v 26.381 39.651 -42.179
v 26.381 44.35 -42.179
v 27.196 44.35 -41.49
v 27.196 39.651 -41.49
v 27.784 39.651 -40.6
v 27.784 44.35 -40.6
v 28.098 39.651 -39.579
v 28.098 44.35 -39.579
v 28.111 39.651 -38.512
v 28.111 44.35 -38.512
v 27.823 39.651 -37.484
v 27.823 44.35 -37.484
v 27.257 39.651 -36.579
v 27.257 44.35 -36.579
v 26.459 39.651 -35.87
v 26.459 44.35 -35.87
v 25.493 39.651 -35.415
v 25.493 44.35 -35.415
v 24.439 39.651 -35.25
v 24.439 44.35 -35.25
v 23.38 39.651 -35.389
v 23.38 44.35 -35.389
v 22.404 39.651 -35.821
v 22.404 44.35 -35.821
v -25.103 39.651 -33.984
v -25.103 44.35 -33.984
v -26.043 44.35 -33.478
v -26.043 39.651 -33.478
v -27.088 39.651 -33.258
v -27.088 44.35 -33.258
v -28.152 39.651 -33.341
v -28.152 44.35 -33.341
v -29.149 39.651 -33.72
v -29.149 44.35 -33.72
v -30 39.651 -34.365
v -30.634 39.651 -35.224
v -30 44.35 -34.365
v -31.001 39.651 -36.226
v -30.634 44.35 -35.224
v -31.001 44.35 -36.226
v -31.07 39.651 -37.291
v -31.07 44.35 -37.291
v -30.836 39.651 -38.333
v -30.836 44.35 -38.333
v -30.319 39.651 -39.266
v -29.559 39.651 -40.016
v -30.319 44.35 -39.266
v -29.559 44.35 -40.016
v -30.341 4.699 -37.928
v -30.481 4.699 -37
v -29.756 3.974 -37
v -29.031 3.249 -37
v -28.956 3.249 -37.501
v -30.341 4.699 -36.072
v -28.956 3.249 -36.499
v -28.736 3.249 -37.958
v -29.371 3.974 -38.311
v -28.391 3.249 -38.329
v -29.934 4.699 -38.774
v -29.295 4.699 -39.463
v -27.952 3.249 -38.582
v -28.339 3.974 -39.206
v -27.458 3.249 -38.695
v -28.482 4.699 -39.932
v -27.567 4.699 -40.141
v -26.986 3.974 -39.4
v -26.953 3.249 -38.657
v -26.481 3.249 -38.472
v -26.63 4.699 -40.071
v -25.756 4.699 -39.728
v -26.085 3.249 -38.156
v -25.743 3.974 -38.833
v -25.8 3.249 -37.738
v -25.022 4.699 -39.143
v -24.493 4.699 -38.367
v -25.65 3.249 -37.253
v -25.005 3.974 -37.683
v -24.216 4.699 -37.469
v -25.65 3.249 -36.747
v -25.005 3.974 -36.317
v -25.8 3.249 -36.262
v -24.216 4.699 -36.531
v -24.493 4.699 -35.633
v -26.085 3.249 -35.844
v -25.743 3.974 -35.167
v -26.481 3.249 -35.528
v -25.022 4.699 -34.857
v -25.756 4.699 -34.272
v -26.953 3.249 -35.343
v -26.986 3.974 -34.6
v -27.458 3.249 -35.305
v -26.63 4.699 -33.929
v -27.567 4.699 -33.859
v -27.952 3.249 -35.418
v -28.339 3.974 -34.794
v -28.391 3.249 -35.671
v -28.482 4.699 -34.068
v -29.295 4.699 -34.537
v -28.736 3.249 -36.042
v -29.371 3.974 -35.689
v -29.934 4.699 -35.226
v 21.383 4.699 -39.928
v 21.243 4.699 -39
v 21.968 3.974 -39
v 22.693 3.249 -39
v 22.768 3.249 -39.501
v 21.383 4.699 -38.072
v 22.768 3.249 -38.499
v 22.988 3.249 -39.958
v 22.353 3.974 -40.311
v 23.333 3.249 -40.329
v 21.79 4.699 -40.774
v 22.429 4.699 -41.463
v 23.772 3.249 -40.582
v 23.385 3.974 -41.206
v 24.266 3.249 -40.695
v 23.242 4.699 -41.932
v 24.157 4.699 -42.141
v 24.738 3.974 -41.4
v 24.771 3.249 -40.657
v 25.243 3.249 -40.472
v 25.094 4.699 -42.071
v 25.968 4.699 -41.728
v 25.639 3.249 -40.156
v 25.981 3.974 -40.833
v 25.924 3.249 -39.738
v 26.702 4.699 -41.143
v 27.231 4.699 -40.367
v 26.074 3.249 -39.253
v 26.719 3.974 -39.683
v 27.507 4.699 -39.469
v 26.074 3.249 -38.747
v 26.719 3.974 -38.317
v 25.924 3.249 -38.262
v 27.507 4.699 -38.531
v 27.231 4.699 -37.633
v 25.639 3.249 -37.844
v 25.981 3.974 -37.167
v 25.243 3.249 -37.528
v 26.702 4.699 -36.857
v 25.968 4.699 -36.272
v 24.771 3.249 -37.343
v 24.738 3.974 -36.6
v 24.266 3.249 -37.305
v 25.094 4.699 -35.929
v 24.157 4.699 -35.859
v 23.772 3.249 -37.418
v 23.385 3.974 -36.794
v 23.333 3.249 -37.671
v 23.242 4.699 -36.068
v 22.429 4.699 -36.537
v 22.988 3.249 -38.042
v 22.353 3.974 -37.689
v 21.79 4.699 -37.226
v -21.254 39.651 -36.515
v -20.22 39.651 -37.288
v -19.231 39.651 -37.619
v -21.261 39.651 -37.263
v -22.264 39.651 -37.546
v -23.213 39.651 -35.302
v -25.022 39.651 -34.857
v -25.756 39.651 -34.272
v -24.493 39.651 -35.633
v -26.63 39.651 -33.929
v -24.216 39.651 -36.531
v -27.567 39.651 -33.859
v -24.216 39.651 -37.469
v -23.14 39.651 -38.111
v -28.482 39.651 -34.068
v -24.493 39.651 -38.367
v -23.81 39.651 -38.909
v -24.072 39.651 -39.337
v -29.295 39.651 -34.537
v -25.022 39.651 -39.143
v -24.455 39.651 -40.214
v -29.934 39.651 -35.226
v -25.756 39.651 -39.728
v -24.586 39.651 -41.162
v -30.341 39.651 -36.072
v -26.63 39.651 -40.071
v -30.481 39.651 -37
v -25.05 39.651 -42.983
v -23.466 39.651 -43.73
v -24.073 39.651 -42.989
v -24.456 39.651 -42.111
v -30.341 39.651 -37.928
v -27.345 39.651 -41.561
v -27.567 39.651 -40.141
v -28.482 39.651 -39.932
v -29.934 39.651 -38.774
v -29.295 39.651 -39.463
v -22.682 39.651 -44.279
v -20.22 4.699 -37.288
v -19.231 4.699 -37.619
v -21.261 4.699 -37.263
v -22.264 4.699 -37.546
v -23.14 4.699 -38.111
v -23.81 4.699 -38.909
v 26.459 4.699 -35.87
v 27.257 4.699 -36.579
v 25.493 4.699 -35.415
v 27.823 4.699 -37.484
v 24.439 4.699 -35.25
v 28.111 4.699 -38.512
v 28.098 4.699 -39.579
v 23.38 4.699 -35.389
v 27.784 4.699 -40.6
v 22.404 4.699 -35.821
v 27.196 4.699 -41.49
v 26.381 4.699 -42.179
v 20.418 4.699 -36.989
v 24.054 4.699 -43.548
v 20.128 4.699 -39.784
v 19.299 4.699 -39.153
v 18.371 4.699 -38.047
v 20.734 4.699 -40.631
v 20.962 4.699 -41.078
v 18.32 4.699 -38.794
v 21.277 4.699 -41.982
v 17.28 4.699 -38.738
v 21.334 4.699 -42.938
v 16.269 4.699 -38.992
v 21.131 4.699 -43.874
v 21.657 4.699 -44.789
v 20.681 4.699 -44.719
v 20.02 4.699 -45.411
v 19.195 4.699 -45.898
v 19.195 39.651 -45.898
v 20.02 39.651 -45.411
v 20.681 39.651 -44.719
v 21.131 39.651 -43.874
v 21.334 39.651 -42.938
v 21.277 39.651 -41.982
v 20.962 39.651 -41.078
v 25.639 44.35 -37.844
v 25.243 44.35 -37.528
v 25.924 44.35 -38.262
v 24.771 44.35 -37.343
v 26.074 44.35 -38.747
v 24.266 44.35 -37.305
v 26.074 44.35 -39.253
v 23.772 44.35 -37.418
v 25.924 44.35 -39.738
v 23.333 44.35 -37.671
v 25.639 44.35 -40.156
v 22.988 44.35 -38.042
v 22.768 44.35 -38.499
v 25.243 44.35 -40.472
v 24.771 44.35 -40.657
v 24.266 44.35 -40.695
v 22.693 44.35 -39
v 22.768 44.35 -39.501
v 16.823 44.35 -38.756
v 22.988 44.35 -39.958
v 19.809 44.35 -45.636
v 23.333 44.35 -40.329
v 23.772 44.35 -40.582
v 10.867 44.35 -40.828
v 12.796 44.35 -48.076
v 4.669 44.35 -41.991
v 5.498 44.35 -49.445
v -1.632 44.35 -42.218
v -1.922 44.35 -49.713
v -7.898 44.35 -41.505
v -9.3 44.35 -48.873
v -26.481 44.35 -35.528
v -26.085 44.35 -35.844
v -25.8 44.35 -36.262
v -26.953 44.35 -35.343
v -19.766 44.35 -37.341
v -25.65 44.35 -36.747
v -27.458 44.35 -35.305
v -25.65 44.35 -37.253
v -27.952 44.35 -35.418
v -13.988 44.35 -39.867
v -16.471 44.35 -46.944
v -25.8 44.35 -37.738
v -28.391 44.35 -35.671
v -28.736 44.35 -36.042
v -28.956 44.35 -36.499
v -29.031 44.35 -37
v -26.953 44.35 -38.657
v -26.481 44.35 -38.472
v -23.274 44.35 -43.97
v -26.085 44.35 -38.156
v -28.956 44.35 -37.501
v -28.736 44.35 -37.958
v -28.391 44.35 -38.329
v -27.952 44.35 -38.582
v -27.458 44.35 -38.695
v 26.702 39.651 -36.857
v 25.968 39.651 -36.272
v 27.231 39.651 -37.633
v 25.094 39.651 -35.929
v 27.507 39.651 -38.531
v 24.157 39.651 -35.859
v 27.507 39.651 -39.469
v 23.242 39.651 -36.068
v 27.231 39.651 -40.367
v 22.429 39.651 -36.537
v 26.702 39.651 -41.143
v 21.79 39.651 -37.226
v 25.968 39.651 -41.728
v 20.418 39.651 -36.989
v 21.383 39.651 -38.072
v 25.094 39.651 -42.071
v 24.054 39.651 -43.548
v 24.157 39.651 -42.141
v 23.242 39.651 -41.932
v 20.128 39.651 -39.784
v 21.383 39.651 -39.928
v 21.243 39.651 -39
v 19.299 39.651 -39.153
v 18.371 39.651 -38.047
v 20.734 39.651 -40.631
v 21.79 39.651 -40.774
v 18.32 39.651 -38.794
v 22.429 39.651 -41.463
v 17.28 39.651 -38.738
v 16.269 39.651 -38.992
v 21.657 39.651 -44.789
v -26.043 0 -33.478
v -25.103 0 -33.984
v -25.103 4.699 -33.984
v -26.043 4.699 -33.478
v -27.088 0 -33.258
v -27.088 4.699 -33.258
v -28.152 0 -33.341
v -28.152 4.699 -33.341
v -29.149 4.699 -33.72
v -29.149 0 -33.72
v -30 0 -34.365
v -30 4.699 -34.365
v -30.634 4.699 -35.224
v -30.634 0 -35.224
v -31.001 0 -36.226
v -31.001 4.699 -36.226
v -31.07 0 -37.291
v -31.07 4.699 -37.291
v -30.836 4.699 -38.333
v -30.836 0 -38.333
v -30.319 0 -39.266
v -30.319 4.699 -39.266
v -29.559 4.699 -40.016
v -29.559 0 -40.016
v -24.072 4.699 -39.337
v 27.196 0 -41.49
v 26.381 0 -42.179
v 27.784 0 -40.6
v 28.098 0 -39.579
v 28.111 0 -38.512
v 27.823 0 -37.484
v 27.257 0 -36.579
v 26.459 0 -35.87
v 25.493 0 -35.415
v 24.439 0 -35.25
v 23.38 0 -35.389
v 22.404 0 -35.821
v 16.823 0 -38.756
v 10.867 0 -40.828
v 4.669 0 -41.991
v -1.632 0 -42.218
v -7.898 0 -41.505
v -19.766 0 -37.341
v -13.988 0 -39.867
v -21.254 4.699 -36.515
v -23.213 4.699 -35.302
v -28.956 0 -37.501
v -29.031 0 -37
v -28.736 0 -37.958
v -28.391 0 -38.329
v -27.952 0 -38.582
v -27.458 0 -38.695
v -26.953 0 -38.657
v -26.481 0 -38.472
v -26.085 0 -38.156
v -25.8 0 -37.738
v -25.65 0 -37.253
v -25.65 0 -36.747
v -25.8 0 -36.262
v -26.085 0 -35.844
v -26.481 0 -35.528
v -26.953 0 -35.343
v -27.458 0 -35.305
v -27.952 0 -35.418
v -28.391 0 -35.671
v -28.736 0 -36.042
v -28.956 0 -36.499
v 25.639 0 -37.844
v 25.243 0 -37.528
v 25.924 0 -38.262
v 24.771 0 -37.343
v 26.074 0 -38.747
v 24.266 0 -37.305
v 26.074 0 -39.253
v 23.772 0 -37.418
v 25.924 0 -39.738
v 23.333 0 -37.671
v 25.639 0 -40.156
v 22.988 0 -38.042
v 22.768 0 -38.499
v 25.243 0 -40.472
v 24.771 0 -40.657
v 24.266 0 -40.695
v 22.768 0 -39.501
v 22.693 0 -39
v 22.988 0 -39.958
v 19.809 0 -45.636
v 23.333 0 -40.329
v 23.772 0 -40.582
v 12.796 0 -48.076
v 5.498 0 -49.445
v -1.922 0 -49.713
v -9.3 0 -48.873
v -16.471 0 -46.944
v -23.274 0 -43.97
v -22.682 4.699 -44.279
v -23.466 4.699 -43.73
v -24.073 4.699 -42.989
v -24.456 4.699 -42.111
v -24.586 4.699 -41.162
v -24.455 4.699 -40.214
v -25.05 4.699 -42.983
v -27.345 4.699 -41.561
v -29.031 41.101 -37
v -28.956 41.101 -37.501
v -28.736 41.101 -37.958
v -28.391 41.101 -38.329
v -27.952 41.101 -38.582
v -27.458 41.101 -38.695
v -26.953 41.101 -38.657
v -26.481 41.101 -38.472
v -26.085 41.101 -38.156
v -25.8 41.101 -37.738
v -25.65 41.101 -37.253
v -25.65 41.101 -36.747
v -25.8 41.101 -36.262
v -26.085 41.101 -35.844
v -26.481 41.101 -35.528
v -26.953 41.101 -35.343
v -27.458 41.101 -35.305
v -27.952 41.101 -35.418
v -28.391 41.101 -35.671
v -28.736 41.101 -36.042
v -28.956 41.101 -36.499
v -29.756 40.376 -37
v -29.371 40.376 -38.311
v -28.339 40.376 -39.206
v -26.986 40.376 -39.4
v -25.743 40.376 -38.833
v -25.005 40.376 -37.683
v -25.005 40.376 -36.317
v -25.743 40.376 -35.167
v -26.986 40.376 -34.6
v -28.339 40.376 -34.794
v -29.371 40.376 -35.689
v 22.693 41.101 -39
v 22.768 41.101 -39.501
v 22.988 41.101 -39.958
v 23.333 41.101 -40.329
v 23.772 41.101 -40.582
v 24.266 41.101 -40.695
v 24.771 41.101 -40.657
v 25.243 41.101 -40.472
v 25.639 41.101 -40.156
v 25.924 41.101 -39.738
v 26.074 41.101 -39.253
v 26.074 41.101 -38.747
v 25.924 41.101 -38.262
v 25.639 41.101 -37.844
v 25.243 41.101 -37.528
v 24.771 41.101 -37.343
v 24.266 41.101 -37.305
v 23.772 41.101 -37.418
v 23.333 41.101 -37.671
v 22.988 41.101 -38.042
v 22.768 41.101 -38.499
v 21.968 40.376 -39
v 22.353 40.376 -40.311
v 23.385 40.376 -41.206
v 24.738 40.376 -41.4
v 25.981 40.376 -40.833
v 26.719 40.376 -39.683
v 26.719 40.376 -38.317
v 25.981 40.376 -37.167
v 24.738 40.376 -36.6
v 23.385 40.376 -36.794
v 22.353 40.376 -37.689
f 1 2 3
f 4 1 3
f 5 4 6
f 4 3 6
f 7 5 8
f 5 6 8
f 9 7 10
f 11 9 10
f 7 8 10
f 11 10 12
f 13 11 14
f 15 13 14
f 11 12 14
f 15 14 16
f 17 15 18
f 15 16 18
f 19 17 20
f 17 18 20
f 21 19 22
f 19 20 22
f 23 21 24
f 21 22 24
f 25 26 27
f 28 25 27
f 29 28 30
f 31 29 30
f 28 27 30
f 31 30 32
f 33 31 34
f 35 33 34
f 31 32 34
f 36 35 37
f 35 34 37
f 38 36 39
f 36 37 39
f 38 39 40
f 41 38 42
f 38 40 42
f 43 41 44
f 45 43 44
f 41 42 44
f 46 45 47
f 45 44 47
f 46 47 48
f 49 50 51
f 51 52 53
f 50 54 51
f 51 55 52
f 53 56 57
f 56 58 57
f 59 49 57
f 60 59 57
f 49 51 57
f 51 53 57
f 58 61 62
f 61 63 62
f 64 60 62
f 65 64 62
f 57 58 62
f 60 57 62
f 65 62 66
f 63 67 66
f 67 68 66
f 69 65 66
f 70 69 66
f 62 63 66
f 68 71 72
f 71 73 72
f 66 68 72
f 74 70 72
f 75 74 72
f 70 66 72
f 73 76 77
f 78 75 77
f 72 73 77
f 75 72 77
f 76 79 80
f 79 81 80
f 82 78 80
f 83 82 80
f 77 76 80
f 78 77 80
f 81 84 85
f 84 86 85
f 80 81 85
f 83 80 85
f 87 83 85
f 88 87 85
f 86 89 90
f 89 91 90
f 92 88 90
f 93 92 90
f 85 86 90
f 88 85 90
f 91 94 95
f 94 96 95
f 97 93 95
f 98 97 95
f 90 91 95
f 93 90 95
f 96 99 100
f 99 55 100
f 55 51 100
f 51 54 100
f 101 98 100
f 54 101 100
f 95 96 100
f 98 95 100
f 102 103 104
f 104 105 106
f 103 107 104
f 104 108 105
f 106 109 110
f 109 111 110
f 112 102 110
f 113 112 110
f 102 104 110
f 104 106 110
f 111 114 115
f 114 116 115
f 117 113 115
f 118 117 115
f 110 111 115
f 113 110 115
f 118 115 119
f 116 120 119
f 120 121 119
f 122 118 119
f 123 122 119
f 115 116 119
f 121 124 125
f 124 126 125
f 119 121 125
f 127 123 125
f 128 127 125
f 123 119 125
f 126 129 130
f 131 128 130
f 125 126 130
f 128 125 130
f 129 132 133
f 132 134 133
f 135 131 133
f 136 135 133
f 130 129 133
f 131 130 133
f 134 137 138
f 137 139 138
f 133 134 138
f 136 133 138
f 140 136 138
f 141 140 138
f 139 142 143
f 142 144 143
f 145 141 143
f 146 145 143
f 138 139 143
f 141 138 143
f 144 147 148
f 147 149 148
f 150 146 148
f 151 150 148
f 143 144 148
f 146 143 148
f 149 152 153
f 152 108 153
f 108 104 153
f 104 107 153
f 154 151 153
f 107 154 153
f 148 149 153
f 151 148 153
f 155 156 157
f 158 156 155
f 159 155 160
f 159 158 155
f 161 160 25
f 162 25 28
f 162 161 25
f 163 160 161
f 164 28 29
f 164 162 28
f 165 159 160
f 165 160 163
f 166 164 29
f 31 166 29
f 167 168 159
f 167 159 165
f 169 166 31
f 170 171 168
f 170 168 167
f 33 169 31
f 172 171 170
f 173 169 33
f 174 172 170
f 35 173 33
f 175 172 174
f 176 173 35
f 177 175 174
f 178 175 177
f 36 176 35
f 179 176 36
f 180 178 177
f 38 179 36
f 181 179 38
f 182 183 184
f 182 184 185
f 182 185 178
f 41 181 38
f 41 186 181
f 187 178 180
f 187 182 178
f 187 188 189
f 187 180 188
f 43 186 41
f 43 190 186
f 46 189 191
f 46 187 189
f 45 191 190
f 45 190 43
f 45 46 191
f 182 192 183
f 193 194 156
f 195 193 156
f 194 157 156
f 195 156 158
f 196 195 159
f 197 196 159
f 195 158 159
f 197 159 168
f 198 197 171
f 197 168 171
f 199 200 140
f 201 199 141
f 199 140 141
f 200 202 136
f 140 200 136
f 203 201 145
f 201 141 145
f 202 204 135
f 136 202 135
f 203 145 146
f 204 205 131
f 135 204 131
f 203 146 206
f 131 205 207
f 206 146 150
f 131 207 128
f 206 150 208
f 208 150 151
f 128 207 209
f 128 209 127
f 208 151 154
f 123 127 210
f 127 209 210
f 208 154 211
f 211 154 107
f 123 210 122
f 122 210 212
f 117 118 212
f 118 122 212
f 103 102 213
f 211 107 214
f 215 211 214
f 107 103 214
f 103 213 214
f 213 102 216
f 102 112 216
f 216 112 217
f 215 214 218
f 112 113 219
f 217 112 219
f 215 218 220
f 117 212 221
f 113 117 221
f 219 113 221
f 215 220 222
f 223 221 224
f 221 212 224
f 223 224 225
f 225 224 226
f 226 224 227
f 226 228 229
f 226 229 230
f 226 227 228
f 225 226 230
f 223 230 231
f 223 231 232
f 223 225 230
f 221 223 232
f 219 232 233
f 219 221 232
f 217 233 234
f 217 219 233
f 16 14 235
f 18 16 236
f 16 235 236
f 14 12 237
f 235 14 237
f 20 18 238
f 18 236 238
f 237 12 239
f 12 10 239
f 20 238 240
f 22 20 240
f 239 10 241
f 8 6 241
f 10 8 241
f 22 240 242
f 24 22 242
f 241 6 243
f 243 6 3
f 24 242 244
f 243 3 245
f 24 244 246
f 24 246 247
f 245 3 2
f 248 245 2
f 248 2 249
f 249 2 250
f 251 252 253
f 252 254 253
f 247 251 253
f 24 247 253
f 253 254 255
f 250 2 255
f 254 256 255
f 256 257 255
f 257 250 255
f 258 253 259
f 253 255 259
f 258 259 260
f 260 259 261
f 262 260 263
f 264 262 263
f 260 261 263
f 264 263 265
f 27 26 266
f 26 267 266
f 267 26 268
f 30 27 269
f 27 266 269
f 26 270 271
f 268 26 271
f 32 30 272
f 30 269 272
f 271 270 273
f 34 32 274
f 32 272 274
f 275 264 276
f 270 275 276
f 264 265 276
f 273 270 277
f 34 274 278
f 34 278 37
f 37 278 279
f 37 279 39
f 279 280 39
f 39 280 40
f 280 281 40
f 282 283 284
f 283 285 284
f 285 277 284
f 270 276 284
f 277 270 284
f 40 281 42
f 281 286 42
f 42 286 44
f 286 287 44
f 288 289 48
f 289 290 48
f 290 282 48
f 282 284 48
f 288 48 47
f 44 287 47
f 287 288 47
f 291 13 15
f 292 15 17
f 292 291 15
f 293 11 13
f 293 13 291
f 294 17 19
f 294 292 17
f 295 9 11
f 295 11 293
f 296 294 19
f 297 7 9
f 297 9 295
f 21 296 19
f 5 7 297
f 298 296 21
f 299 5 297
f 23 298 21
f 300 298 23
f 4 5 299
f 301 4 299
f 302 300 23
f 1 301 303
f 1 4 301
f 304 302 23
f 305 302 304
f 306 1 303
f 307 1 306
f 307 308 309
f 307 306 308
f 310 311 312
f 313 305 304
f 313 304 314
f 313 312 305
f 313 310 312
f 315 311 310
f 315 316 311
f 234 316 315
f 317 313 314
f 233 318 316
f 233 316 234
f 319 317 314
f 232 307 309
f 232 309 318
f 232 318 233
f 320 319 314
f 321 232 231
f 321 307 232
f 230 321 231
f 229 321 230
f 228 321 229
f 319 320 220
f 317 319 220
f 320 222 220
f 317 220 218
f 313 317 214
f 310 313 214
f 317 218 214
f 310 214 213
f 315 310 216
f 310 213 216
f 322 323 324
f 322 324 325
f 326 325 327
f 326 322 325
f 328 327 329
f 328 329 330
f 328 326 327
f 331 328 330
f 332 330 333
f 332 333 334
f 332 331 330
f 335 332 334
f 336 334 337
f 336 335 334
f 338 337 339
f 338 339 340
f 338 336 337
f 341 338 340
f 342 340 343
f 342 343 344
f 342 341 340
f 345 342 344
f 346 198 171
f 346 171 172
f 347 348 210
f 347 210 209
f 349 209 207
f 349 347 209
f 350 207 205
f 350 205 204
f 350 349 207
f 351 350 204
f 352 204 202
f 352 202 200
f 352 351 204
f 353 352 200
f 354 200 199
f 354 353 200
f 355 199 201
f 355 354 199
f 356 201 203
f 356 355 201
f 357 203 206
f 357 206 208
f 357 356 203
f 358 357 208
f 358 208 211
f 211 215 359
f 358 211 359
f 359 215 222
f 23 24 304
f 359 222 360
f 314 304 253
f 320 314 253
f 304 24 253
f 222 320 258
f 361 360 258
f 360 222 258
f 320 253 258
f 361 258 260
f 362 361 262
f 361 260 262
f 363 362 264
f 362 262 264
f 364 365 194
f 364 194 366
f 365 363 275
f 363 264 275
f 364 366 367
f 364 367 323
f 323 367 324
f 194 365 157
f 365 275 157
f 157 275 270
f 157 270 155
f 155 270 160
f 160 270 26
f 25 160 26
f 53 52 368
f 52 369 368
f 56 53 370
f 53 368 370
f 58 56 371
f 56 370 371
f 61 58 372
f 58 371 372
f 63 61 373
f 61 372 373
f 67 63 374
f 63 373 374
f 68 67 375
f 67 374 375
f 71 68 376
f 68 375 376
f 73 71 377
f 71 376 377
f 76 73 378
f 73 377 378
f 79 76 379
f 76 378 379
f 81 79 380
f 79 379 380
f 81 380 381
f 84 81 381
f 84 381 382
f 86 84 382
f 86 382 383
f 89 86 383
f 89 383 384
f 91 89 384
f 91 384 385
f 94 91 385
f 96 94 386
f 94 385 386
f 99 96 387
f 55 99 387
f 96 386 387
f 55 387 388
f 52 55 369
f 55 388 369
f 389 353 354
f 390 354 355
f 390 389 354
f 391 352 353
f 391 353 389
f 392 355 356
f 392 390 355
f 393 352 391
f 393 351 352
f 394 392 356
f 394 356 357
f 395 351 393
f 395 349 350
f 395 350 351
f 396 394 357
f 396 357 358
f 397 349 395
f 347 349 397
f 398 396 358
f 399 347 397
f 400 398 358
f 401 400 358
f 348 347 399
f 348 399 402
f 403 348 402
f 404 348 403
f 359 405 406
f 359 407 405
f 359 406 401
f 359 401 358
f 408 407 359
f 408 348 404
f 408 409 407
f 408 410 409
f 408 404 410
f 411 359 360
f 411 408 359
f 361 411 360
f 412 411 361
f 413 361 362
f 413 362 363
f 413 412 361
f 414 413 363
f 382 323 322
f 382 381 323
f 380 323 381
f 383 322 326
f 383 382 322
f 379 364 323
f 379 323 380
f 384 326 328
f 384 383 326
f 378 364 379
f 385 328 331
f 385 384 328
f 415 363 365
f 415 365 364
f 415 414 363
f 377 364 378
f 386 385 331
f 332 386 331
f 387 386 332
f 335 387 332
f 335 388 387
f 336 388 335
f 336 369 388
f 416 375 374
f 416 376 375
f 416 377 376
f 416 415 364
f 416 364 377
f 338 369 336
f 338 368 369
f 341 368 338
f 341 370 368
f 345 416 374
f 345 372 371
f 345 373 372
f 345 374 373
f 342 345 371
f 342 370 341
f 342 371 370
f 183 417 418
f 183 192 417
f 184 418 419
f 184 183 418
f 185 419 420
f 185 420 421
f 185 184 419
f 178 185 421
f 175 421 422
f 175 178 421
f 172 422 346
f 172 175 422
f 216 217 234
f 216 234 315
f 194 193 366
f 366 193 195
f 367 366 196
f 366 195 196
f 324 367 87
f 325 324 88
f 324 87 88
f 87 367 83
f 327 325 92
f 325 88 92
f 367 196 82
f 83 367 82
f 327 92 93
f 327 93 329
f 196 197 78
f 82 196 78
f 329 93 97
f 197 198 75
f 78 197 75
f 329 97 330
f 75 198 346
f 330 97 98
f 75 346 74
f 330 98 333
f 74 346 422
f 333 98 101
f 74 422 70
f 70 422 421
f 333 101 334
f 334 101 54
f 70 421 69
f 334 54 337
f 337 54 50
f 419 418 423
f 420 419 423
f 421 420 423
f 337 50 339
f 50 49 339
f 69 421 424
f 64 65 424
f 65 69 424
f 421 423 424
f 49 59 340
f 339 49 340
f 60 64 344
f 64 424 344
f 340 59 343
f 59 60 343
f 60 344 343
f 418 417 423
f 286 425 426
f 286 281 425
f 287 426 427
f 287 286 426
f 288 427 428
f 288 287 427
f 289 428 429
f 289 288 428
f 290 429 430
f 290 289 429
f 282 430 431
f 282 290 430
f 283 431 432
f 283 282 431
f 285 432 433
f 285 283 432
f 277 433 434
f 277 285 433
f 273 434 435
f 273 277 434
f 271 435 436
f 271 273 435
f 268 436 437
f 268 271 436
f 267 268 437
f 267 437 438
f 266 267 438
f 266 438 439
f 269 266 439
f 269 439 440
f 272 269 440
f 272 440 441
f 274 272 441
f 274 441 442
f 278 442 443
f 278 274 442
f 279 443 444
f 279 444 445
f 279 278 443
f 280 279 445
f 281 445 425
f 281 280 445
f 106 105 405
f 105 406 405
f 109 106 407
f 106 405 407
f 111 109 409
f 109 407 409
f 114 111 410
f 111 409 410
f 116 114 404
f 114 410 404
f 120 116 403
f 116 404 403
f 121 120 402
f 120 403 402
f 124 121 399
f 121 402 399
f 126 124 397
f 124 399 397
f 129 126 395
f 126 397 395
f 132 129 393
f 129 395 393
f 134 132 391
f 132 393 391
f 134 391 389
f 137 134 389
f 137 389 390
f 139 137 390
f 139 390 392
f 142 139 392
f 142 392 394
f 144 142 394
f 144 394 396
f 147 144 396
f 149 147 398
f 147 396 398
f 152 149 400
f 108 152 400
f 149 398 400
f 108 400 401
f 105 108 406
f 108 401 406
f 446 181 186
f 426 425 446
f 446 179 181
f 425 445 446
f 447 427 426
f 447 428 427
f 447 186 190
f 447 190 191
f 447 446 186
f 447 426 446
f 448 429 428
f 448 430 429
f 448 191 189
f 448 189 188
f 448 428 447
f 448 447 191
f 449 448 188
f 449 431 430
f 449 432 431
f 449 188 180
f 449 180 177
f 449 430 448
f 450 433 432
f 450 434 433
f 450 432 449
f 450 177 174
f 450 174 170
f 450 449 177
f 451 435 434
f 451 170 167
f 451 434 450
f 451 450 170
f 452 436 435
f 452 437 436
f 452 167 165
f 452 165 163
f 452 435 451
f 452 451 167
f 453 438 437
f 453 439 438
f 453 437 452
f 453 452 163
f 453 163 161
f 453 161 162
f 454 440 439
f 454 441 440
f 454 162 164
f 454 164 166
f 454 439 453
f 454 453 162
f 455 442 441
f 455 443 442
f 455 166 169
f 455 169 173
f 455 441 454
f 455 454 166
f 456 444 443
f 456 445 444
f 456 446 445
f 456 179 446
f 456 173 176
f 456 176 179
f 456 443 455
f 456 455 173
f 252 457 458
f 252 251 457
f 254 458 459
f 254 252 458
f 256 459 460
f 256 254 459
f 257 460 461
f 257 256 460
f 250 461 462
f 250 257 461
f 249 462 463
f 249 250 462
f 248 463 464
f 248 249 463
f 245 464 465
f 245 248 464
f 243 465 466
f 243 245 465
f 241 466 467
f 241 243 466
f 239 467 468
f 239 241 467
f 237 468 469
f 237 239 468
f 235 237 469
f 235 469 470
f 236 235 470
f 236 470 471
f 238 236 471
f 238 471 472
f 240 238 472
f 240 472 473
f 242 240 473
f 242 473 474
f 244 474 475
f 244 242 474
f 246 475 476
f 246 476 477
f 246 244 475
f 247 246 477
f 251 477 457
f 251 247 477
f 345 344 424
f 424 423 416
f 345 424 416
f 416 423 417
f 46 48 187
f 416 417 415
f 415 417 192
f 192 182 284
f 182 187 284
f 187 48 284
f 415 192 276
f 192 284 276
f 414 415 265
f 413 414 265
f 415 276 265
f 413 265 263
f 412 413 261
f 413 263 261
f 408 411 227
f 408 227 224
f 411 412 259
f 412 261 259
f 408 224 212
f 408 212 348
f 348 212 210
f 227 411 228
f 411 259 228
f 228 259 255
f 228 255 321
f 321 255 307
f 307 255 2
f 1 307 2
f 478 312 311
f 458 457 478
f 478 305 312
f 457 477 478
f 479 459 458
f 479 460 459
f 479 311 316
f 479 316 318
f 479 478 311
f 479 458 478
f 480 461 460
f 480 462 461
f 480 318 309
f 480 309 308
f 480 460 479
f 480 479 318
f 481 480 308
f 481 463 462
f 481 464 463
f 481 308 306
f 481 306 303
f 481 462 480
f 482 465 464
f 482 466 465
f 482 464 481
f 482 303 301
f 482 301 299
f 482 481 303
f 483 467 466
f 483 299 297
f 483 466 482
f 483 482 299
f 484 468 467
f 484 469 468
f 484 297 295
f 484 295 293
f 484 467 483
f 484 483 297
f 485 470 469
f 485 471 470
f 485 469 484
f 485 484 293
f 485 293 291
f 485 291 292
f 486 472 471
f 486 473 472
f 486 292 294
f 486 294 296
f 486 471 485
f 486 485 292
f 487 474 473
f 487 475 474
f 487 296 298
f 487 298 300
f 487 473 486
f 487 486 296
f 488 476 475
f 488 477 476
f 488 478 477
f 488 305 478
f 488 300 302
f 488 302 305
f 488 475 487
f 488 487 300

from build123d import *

# Parameters (mm, degrees)
BOSS_EXTRUDE1_DEPTH                             = 4.699
CSK_FOR_M3_FLAT_HEAD_MACHINE_SCREW1_D           = 3.4
CSK_FOR_M3_FLAT_HEAD_MACHINE_SCREW1_CSINK_D     = 6.3
CSK_FOR_M3_FLAT_HEAD_MACHINE_SCREW1_CSINK_ANGLE = 90
BOSS_EXTRUDE2_DEPTH                             = 17.476
FILLET1_R                                       = 3.5


# Read off the part's stored shape, not the designer's step: Mirror1
with BuildPart() as part:
    # Sketch1 → Boss-Extrude1 (new body)
    with BuildSketch(Plane(origin=(0, 0, 0), x_dir=(1, 0, 0), z_dir=(0, 1, 0))):
        with BuildLine():
            ThreePointArc((-29.559395906245367, 40.016304347826086), (-1.9222382209583215, 49.71285045359888), (26.381150789265686, 42.17934782608695))
            ThreePointArc((26.381150789265686, 42.17934782608695), (27.57196966138789, 37.011471046035254), (22.404092881336187, 35.82065217391305))
            ThreePointArc((22.404092881336187, 35.82065217391305), (-1.6324535645324438, 42.21845088772971), (-25.10320556862043, 33.983695652173914))
            ThreePointArc((-25.10320556862043, 33.983695652173914), (-30.347605085258984, 34.771904831187534), (-29.559395906245367, 40.016304347826086))
        make_face()
    extrude(amount=BOSS_EXTRUDE1_DEPTH)

    # CSK for M3 Flat Head Machine Screw1 (through all)
    with Locations(Plane(origin=(0, 4.699, 0), x_dir=(1, 0, 0), z_dir=(0, 1, 0))):
        with Locations((-27.331300737, 37), (24.392621835, 39)):
            CounterSinkHole(CSK_FOR_M3_FLAT_HEAD_MACHINE_SCREW1_D / 2, CSK_FOR_M3_FLAT_HEAD_MACHINE_SCREW1_CSINK_D / 2, counter_sink_angle=CSK_FOR_M3_FLAT_HEAD_MACHINE_SCREW1_CSINK_ANGLE)

    # Sketch4 → Boss-Extrude2 (add)
    with BuildSketch(Plane(origin=(0, 4.699, 0), x_dir=(1, 0, 0), z_dir=(0, 1, 0))):
        with BuildLine():
            Line((-22.05301335725447, 36.037856510408), (-25.967749456175376, 42.43510914539167))
            ThreePointArc((-25.967749456175376, 42.43510914539167), (-1.9222382209583215, 49.71285045359888), (22.613452452482438, 44.31359010709148))
            Line((22.613452452482438, 44.31359010709148), (19.204389268691116, 37.633149387429455))
            ThreePointArc((19.204389268691116, 37.633149387429455), (-1.6324535645324438, 42.21845088772971), (-22.05301335725447, 36.037856510408))
        make_face()
    extrude(amount=BOSS_EXTRUDE2_DEPTH)

    # Mirror1: part across plane


with BuildPart() as part_1:
    add(part.part)
    add(part.part.mirror(Plane(origin=(12.196310917650468, 22.175, -19.5), x_dir=(0, 0, 1), z_dir=(0, -1, 0))))

    # Fillet1
    fillet1_edges = [part_1.edges().sort_by_distance(p)[0] for p in [
        (19.204389268691116, 22.175000000000004, -37.633149387429455),
        (-22.053013357254475, 22.175, -36.037856510408005),
        (-25.967749456175373, 22.175000000000004, -42.43510914539168),
        (22.613452452482434, 22.175, -44.313590107091485),
    ]]
    fillet(fillet1_edges, radius=FILLET1_R)


solid = part_1.part
